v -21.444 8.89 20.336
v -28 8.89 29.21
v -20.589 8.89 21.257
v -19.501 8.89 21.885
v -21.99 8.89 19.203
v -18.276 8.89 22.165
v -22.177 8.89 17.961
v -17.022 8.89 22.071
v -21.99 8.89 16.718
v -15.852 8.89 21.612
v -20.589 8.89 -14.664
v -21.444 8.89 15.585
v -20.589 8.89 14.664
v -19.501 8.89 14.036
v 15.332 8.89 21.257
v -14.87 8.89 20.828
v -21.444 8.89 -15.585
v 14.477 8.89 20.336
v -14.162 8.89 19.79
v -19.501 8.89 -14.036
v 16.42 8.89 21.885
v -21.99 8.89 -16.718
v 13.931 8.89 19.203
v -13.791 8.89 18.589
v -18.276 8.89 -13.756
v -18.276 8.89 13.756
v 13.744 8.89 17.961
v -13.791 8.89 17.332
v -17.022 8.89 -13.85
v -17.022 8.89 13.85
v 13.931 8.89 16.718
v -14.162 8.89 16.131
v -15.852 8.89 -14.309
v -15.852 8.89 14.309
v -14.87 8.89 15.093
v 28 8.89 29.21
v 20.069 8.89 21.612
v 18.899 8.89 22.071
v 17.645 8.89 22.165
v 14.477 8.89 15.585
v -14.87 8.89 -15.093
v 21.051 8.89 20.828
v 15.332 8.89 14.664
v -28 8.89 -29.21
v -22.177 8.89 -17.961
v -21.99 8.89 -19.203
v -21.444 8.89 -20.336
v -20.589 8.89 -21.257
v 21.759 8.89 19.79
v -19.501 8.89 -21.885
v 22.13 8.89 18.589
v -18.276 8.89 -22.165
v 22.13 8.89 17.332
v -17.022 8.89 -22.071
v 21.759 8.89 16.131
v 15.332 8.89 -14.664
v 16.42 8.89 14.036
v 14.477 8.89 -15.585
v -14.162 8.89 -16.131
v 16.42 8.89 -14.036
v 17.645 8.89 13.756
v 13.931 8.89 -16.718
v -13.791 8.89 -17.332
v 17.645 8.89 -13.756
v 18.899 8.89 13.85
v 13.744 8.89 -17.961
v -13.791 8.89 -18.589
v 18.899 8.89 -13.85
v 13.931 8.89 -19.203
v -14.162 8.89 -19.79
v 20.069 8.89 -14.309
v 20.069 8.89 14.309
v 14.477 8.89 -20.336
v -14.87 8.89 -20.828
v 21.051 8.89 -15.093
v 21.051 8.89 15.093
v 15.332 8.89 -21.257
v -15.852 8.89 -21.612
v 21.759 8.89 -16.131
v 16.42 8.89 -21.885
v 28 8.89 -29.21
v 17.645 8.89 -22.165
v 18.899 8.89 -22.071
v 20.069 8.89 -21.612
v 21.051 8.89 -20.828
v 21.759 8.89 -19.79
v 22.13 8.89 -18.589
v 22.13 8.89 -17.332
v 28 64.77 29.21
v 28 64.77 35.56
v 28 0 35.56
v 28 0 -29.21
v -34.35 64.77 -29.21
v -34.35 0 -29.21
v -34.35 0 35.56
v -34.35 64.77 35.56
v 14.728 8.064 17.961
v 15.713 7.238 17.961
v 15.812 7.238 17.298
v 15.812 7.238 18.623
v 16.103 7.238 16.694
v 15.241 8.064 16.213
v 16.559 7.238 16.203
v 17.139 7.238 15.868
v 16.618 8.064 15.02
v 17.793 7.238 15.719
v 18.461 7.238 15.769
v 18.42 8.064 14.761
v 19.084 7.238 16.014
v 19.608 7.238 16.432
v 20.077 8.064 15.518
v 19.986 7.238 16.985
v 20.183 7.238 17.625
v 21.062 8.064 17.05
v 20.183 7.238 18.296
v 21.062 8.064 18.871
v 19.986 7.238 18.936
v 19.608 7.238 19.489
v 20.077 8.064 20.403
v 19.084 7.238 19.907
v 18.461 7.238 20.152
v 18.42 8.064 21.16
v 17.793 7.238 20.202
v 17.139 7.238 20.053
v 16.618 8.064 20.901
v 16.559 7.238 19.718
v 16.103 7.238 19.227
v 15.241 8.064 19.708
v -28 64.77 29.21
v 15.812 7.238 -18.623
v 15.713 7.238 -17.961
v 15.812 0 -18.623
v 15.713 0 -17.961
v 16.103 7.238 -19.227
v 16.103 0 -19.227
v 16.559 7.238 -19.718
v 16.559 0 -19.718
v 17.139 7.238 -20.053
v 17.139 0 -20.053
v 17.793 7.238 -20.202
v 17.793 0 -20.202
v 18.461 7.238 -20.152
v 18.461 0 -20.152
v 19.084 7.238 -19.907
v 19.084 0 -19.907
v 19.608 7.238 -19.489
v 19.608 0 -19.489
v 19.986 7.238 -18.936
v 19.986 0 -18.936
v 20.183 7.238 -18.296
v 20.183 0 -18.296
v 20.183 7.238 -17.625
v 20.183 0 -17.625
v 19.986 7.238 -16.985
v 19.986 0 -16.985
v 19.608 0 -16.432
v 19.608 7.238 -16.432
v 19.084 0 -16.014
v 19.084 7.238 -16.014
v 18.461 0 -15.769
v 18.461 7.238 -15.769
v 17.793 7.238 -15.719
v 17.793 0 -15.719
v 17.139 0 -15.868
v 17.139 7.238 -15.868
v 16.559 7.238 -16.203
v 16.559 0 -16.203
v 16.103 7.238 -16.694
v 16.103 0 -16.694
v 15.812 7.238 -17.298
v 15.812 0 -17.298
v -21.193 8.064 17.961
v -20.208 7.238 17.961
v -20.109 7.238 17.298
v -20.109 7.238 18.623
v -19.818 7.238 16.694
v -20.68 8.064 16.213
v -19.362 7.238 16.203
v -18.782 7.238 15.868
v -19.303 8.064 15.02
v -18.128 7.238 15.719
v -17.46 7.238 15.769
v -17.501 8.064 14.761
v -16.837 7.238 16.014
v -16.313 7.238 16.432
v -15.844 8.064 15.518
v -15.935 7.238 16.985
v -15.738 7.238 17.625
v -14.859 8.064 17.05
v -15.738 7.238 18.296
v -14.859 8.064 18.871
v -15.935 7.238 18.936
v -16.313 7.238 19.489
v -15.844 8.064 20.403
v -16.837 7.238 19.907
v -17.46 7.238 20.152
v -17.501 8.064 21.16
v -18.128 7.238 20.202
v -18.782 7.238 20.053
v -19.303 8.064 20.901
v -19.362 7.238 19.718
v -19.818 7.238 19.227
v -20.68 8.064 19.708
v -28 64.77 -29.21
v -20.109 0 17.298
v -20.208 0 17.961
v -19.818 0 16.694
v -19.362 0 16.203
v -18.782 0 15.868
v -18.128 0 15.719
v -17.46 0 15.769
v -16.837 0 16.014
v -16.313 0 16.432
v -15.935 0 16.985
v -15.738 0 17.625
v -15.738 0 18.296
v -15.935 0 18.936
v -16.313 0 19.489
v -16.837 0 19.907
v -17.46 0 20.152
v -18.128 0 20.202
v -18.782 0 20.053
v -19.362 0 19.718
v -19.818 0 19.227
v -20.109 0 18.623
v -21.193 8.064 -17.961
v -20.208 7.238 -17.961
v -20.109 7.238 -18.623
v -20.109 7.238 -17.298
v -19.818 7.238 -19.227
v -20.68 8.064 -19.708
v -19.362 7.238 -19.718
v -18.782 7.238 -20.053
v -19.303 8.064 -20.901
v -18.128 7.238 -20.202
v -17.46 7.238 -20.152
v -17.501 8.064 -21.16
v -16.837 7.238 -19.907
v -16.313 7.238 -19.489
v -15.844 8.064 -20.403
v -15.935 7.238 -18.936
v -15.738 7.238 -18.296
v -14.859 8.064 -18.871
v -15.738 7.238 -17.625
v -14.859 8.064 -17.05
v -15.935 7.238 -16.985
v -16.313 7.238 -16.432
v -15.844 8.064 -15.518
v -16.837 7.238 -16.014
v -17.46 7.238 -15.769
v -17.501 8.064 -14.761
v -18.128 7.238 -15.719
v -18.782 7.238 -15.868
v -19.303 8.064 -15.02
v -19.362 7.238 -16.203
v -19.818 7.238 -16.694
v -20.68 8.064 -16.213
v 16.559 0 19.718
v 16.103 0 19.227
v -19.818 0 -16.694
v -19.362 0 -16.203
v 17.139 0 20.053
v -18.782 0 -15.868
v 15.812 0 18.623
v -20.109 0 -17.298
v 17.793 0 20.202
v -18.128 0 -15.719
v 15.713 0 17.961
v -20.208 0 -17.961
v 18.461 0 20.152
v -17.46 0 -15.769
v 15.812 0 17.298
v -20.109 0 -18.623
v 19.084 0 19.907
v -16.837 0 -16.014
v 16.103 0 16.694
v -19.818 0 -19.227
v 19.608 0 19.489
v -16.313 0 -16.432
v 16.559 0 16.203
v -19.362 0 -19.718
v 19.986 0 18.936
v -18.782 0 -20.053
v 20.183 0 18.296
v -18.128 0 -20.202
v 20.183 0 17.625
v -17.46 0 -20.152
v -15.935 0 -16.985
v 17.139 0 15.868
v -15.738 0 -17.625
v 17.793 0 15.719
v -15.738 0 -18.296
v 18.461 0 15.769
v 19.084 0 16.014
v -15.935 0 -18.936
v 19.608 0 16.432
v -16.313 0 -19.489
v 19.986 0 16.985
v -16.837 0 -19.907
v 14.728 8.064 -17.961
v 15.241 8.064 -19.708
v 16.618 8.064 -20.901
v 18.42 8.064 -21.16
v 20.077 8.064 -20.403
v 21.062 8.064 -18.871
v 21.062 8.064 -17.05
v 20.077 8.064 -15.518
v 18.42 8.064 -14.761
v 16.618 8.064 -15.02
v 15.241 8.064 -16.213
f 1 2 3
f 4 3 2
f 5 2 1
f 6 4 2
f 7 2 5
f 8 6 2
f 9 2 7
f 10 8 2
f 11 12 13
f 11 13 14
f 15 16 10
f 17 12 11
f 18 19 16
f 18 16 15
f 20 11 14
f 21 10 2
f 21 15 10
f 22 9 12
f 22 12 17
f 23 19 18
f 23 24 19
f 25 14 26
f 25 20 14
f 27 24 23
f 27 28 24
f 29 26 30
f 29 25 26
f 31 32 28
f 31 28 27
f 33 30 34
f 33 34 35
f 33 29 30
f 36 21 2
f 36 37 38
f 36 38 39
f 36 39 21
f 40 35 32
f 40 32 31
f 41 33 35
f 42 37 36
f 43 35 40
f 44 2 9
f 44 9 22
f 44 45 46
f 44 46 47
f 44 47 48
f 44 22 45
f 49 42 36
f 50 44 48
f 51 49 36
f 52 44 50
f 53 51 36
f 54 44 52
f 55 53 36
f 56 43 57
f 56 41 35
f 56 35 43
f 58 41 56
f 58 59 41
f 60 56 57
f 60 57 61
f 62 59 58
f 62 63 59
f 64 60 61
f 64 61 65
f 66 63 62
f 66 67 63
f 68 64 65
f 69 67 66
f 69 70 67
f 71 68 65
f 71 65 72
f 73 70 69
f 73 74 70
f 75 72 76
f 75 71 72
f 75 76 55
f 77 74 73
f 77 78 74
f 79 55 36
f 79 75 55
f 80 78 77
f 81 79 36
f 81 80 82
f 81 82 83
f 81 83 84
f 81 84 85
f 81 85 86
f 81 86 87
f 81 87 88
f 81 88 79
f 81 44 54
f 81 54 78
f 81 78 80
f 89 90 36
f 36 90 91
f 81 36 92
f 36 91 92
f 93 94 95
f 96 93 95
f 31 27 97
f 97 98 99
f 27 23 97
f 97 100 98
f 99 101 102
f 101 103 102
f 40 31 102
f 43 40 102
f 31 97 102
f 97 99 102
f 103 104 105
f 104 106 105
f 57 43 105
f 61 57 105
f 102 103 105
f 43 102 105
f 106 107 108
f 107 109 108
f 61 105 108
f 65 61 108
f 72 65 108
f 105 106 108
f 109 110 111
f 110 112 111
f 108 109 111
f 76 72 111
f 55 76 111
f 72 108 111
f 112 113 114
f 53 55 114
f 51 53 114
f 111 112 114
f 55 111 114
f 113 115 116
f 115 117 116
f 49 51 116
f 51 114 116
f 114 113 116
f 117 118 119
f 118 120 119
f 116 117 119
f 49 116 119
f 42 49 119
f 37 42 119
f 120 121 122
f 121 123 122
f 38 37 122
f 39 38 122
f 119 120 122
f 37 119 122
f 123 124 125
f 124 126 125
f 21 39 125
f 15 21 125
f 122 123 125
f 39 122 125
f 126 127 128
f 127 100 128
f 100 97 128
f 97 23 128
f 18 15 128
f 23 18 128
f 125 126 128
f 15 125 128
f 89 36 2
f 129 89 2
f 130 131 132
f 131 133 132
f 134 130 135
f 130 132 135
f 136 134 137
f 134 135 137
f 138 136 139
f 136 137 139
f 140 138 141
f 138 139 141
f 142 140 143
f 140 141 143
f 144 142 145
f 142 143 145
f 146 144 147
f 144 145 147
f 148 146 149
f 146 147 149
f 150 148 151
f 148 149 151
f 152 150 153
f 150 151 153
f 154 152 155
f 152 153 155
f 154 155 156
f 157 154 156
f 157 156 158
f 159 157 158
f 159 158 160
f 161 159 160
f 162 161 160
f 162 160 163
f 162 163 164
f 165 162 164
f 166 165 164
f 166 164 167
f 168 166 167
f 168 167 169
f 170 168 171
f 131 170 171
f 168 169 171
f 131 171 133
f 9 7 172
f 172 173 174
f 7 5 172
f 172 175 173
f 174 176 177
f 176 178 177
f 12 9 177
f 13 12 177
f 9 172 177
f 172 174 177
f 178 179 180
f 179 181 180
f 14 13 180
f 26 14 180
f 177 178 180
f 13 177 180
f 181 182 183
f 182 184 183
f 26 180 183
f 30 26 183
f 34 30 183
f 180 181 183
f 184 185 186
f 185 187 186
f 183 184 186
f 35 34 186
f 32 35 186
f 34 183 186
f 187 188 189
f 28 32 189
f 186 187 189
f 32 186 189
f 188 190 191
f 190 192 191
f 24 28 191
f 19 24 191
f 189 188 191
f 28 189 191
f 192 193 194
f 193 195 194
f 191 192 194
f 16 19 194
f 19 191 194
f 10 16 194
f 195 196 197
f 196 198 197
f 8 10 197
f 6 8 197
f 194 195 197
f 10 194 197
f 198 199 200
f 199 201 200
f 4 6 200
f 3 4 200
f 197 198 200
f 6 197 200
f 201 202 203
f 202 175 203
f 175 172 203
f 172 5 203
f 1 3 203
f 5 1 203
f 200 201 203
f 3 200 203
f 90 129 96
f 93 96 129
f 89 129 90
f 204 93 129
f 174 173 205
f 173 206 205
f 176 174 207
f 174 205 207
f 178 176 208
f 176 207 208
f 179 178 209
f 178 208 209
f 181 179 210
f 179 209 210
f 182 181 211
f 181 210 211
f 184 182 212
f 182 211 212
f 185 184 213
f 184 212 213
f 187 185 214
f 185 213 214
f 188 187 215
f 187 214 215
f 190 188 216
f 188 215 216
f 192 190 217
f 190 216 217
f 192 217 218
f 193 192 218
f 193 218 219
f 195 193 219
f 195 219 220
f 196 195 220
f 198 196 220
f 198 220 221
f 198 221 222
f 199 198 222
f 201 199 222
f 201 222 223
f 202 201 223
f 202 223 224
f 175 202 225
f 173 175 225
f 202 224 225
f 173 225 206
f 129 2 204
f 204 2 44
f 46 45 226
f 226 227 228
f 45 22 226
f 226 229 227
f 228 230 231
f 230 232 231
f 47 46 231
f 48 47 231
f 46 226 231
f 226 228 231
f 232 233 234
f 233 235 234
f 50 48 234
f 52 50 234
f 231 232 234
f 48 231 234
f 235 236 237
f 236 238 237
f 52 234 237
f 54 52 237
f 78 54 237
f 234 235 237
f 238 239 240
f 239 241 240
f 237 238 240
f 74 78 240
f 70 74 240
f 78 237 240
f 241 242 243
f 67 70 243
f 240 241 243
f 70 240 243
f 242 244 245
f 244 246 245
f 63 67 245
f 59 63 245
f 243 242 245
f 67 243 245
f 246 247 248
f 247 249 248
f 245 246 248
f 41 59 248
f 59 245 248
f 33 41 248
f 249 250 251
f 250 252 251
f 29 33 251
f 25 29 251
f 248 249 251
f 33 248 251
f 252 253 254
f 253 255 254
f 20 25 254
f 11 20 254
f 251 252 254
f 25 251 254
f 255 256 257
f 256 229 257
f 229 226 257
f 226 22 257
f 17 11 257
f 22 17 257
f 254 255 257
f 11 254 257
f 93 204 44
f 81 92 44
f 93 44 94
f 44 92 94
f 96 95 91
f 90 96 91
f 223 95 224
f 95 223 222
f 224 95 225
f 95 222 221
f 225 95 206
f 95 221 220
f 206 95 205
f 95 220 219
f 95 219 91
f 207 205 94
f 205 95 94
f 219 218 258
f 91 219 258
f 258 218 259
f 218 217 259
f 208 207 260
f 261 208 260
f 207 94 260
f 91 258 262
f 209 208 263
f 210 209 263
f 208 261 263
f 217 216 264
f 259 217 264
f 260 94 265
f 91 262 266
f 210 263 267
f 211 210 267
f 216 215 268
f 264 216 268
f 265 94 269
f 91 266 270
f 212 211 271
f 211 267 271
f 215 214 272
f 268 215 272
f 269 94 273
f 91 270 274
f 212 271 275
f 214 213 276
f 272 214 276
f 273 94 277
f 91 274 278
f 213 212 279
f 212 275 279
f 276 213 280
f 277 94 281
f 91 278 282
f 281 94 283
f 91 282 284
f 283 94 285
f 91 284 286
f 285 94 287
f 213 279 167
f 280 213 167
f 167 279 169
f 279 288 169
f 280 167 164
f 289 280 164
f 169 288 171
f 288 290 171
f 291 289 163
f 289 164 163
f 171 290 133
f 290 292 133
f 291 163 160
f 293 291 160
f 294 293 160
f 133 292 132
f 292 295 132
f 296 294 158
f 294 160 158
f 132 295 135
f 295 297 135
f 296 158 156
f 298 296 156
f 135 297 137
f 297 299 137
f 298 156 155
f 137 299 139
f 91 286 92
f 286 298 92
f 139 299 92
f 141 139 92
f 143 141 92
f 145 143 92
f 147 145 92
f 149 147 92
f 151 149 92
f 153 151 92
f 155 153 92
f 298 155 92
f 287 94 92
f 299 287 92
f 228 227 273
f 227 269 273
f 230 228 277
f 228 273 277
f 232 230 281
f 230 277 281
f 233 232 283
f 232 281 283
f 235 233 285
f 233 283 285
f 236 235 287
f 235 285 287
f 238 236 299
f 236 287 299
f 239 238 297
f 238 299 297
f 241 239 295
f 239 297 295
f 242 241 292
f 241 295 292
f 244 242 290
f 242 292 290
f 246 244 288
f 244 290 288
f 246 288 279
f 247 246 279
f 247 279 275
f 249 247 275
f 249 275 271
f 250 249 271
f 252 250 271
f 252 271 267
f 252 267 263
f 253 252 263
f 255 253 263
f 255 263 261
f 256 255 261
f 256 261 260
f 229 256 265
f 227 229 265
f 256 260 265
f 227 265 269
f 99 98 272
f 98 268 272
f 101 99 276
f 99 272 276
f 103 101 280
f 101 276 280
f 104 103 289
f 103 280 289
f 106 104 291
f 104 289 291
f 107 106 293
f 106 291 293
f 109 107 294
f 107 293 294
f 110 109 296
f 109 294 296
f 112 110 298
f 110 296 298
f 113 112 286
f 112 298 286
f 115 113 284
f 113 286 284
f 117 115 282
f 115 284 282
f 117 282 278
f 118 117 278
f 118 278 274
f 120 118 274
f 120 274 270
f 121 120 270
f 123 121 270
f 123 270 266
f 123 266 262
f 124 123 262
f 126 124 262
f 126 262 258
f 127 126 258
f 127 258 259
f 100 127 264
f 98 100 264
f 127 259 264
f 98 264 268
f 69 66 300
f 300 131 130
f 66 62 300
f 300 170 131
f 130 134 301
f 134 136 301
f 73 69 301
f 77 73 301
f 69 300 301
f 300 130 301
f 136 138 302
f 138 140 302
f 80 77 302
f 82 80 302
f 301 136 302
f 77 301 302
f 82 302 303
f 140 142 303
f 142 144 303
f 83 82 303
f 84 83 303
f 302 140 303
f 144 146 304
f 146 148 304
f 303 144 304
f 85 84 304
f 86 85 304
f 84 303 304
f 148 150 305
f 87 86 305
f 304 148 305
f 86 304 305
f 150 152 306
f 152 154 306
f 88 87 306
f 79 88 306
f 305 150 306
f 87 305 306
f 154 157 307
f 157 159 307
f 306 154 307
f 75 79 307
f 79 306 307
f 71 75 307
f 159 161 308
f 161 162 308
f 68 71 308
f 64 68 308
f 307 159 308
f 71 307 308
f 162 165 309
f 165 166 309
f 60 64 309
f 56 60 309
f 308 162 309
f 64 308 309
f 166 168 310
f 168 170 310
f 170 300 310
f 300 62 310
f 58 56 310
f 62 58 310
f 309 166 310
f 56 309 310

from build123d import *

# Parameters (mm, degrees)
MOTORPROFILE_W                                    = 56
MOTORPROFILE_H                                    = 58.42
BOSS_EXTRUDE2_DEPTH                               = 8.89
BOSS_EXTRUDE3_DEPTH                               = 64.77
CSK_FOR_8_FLAT_HEAD_MACHINE_SCREW_100_D           = 4.4958
CSK_FOR_8_FLAT_HEAD_MACHINE_SCREW_100_CSINK_D     = 8.4328
CSK_FOR_8_FLAT_HEAD_MACHINE_SCREW_100_CSINK_ANGLE = 100


with BuildPart() as part:
    # MotorProfile → Boss-Extrude2 (new body)
    with BuildSketch(Plane(origin=(0, 0, 0), x_dir=(1, 0, 0), z_dir=(0, 1, 0))):
        Rectangle(MOTORPROFILE_W, MOTORPROFILE_H)
    extrude(amount=BOSS_EXTRUDE2_DEPTH)

    # Sketch2 → Boss-Extrude3 (add)
    with BuildSketch(Plane(origin=(0, 0, 0), x_dir=(1, 0, 0), z_dir=(0, 1, 0))):
        Polygon((-34.35, 29.21), (-34.35, -35.56), (28, -35.56), (28, -29.21), (-28, -29.21), (-28, 29.21), align=None)
    extrude(amount=BOSS_EXTRUDE3_DEPTH)

    # CSK for #8 Flat Head Machine Screw (100)2 (through all)
    with Locations(Plane(origin=(0, 8.89, 0), x_dir=(1, 0, 0), z_dir=(0, 1, 0))):
        with Locations((17.960512242, 17.960512242), (17.960512242, -17.960512242), (-17.960512242, -17.960512242), (-17.960512242, 17.960512242)):
            CounterSinkHole(CSK_FOR_8_FLAT_HEAD_MACHINE_SCREW_100_D / 2, CSK_FOR_8_FLAT_HEAD_MACHINE_SCREW_100_CSINK_D / 2, counter_sink_angle=CSK_FOR_8_FLAT_HEAD_MACHINE_SCREW_100_CSINK_ANGLE)


solid = part.part
